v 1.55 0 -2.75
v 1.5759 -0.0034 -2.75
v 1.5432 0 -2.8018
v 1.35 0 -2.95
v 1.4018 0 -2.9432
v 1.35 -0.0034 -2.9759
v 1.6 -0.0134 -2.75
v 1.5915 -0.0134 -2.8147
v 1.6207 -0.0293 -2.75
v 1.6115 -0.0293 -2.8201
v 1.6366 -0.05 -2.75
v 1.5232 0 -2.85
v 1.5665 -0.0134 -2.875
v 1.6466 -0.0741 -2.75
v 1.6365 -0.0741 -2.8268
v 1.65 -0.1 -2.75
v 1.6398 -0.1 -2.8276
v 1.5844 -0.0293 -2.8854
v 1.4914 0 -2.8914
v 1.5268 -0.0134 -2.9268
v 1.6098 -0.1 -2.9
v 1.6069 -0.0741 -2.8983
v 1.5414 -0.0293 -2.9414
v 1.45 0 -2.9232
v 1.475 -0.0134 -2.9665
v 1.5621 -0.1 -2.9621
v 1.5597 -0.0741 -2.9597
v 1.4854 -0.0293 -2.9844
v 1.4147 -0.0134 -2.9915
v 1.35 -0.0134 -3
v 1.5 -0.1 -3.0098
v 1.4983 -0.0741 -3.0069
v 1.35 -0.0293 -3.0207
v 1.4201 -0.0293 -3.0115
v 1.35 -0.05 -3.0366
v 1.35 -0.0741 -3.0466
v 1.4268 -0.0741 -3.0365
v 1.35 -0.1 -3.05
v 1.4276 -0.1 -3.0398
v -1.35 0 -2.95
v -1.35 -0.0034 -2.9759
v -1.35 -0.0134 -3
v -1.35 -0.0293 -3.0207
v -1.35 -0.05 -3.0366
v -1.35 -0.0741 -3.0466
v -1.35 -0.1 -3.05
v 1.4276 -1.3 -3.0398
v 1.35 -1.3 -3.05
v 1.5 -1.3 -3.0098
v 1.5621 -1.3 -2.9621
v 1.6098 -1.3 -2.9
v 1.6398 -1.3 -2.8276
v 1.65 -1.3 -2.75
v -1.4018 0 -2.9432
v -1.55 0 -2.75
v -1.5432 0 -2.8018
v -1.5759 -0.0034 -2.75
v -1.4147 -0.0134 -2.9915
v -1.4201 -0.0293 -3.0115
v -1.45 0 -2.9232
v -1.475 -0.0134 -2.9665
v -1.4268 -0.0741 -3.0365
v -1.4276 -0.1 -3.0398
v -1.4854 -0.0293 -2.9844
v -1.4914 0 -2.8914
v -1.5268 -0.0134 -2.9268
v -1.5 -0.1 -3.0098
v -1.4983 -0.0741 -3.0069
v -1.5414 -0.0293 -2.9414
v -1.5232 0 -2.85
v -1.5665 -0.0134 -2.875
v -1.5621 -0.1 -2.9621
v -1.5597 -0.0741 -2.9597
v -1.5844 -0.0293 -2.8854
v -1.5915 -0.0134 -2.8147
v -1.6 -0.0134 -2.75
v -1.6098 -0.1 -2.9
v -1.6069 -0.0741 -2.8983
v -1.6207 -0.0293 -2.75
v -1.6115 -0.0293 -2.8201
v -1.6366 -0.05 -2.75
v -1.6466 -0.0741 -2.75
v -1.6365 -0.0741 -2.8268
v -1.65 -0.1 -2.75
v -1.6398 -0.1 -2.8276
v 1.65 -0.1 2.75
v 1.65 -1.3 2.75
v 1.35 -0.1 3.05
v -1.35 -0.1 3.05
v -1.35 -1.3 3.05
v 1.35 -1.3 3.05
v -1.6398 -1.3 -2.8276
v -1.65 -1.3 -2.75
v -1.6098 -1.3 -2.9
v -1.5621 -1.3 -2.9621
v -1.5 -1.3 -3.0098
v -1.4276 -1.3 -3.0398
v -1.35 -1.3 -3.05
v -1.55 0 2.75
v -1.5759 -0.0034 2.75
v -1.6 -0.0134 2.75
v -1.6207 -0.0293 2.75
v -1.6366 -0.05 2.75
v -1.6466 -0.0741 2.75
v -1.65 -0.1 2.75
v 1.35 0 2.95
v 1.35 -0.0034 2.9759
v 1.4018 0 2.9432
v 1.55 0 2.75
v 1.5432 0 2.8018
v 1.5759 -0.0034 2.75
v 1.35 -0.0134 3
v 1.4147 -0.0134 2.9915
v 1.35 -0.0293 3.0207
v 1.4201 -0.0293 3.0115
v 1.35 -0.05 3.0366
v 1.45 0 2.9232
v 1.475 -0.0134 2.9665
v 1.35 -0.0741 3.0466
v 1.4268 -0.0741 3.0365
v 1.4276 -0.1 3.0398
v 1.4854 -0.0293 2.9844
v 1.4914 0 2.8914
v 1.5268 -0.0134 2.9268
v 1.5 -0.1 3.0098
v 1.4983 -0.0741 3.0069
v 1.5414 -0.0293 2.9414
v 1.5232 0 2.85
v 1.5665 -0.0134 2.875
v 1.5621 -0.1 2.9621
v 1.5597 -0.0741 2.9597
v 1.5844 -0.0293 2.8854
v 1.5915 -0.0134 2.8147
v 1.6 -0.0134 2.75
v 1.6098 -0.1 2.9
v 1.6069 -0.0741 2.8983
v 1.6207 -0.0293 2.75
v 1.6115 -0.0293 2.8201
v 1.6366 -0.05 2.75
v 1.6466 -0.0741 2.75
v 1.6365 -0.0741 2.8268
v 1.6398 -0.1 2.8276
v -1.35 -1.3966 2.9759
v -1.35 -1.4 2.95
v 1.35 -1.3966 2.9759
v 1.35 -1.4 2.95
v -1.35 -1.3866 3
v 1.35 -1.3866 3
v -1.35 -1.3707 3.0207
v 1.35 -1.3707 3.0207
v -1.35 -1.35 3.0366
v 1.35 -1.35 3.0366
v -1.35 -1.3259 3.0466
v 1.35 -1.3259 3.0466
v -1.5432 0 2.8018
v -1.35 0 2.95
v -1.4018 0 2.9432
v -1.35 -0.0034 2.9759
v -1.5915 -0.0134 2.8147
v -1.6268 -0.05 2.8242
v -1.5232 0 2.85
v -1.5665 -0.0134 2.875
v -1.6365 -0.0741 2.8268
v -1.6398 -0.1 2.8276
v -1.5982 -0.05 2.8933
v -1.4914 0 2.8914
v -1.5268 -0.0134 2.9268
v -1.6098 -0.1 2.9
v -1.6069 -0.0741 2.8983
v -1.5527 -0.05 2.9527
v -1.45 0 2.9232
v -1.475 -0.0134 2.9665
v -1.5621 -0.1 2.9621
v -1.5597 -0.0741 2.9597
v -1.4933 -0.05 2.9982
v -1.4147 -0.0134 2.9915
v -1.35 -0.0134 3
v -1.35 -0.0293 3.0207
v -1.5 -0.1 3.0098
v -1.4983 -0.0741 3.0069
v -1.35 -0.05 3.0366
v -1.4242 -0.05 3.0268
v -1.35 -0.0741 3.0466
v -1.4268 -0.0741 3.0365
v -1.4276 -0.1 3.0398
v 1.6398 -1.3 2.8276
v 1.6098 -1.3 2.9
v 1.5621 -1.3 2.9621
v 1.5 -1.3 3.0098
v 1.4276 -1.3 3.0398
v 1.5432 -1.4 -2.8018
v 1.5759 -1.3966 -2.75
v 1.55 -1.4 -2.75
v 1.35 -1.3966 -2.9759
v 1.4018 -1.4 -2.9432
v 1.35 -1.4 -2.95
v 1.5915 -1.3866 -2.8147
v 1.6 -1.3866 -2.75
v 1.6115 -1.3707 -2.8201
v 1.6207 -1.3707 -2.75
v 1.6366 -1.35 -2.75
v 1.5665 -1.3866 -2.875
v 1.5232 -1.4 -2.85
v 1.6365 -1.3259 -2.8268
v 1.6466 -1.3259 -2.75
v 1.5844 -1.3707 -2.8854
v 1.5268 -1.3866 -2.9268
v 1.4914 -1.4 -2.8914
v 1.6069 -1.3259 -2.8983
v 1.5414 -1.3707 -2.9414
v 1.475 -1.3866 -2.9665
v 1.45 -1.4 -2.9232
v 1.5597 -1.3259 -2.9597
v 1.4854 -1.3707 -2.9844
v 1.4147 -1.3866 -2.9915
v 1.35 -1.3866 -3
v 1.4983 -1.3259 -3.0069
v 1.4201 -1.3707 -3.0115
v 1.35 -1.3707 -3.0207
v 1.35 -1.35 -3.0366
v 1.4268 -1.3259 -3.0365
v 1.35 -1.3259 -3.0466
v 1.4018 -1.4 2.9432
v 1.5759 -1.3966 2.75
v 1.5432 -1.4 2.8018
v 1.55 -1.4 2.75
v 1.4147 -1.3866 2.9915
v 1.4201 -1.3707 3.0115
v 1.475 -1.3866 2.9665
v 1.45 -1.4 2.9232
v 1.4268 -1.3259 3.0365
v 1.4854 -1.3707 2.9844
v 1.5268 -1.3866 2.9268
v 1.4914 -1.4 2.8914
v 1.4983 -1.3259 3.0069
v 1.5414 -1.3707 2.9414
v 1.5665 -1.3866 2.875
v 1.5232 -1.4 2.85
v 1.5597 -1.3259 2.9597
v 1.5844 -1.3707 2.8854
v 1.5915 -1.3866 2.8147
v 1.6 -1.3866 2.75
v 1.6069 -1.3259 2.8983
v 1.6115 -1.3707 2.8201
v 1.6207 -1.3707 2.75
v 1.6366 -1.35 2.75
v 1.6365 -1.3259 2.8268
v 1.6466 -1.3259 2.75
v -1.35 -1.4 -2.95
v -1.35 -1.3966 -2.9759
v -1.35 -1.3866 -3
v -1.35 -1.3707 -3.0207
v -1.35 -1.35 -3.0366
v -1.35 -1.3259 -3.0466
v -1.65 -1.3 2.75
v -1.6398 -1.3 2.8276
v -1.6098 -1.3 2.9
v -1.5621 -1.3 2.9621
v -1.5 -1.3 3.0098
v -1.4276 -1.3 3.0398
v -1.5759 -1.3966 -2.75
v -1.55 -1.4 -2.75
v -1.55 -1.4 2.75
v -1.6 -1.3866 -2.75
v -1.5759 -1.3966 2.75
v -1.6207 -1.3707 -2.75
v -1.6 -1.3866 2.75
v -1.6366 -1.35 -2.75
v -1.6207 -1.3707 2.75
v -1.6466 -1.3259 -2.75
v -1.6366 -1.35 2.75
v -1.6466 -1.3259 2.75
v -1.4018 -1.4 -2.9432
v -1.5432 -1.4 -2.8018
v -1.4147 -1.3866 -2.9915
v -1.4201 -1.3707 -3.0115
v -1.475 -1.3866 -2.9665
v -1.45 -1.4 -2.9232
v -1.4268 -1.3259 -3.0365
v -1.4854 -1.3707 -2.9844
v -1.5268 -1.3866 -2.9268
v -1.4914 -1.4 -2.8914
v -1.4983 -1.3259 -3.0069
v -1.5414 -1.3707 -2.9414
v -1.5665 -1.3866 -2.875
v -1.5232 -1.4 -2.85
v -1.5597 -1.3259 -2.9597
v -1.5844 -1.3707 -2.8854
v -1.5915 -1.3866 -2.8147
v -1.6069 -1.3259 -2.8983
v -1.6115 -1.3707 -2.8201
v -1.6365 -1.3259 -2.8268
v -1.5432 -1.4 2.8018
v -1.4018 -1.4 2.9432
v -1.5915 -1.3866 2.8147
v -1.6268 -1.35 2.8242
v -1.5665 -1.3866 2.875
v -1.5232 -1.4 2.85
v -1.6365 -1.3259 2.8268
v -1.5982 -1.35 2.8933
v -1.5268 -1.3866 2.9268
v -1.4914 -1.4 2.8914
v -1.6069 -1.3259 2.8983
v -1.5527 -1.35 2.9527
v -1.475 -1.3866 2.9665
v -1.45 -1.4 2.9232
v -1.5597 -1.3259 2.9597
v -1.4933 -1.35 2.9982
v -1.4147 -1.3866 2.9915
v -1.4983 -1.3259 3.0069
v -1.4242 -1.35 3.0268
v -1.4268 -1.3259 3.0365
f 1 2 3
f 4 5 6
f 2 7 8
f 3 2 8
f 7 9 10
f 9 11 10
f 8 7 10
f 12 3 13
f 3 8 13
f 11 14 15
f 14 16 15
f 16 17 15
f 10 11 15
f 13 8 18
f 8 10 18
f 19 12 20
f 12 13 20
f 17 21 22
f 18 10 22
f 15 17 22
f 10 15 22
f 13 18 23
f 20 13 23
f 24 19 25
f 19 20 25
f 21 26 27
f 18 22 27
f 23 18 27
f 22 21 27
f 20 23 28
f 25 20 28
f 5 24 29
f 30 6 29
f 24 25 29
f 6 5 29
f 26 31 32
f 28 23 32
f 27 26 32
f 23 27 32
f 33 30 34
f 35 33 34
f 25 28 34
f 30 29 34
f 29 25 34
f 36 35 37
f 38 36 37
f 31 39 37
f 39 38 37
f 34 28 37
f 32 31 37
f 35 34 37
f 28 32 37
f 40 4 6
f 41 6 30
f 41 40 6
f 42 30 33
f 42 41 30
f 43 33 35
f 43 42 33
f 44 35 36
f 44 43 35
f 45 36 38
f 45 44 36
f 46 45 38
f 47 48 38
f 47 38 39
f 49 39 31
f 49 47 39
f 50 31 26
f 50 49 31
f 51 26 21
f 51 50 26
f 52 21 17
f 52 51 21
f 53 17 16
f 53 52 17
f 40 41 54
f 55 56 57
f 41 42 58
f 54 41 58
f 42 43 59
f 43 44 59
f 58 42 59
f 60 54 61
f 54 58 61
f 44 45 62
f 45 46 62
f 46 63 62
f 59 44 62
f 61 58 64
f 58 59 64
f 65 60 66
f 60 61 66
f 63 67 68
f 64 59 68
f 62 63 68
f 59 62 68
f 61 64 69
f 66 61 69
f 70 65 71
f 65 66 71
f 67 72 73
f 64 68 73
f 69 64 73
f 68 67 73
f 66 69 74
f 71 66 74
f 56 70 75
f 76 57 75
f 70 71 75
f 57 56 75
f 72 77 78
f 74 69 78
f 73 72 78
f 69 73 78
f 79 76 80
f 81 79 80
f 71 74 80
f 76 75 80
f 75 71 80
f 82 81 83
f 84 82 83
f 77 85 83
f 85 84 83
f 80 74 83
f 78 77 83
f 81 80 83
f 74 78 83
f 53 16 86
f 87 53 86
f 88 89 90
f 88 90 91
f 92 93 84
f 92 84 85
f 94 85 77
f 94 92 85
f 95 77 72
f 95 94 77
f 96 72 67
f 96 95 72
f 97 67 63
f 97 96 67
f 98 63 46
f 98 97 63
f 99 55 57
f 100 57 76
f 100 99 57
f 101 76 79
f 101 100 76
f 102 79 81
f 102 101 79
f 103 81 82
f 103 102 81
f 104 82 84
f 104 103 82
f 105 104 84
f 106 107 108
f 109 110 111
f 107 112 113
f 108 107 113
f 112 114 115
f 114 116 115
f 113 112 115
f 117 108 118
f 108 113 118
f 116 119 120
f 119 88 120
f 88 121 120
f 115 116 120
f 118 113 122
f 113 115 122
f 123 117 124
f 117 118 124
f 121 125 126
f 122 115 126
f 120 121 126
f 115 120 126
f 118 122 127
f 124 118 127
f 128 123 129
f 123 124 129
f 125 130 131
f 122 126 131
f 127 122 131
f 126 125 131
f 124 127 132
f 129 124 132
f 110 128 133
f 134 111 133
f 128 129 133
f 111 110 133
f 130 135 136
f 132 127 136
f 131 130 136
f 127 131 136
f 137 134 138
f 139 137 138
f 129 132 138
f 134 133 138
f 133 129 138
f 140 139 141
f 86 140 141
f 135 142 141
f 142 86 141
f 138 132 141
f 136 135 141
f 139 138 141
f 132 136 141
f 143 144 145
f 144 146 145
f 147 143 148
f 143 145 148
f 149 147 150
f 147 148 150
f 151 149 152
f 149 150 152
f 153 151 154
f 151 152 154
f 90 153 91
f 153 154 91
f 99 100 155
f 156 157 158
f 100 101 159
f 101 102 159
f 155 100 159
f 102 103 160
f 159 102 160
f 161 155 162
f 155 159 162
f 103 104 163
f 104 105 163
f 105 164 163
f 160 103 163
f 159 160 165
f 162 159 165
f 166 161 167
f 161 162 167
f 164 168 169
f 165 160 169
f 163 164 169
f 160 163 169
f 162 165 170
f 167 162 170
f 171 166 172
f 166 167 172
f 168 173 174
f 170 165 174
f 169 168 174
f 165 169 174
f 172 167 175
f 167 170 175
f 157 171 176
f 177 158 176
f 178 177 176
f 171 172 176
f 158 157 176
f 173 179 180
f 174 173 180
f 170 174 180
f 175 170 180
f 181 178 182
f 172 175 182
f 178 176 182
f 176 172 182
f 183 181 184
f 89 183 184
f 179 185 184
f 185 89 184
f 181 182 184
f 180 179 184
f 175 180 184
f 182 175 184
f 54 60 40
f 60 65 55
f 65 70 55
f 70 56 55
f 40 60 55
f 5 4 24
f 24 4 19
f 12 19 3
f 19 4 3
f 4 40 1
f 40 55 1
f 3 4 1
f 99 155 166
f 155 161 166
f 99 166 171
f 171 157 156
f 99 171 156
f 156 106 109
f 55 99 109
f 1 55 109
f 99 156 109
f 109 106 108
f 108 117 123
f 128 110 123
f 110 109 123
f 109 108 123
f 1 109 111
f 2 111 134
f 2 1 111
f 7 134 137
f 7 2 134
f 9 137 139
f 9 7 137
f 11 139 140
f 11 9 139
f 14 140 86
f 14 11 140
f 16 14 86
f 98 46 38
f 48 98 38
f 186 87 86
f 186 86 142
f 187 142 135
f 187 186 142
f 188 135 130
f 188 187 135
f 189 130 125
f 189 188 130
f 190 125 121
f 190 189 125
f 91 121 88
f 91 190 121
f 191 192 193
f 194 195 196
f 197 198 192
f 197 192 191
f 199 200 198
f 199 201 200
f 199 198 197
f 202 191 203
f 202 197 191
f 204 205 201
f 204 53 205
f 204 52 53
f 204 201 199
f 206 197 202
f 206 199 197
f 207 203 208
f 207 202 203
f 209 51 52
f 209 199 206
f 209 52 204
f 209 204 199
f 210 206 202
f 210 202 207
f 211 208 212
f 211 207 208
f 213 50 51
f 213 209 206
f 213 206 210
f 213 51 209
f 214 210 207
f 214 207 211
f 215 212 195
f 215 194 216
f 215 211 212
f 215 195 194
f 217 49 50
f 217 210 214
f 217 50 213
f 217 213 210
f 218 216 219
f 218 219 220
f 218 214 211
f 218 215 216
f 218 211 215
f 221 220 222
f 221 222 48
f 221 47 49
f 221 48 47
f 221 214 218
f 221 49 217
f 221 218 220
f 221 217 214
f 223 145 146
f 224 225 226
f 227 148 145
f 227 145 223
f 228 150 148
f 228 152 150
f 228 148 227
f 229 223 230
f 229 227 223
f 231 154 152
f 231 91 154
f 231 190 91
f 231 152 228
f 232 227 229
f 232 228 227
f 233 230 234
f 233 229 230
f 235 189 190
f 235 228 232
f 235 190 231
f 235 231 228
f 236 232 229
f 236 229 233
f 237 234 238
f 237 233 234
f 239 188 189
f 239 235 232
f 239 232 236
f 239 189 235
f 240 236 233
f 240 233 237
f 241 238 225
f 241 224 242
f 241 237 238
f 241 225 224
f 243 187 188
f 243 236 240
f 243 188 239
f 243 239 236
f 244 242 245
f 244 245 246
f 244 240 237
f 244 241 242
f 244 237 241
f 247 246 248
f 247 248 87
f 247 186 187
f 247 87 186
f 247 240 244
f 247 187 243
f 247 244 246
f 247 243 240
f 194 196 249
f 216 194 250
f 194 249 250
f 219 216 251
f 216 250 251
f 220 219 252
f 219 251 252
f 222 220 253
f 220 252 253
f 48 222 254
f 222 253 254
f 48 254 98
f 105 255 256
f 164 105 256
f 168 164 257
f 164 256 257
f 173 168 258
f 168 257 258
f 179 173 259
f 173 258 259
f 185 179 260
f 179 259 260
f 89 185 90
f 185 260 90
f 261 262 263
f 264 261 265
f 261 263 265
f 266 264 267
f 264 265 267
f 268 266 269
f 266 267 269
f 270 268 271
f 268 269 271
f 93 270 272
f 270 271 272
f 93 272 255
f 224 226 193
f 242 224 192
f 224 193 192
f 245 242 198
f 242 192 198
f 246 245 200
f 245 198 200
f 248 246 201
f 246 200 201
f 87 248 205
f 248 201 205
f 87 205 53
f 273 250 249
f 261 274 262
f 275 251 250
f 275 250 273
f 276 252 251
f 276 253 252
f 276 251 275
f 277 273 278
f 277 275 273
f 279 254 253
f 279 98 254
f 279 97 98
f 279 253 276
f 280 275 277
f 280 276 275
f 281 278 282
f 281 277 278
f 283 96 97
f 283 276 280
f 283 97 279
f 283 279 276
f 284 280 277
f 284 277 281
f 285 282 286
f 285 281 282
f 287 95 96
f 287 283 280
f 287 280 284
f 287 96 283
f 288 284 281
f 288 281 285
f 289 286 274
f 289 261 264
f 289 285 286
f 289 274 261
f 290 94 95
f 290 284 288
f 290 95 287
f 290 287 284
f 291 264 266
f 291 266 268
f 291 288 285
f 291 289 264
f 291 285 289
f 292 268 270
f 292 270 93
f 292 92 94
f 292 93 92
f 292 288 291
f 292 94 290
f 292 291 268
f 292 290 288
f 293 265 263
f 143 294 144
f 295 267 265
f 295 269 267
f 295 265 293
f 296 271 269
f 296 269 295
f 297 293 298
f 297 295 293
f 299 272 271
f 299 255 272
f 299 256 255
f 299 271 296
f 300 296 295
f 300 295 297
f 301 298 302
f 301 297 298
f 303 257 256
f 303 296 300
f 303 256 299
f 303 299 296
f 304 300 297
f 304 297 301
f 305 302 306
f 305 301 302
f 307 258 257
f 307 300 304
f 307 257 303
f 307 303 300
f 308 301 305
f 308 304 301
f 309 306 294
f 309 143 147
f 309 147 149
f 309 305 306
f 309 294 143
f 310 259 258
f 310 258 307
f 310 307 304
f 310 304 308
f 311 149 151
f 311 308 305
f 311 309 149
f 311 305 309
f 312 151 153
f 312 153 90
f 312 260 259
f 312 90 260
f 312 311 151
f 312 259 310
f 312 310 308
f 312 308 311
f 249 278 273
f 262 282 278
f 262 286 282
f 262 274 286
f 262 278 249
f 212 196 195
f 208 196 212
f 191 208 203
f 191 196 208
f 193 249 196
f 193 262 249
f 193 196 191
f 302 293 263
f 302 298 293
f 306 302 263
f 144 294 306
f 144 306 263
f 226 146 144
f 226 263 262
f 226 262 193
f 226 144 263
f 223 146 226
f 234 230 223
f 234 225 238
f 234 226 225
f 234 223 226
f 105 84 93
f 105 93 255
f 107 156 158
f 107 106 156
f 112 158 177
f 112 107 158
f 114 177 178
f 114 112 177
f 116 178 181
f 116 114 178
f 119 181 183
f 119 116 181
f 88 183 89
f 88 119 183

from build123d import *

# Parameters (mm, degrees)
F0_W     = 3.3
F0_H     = 6.1
F1_DEPTH = 1.4
F2_R     = 0.3
F3_R     = 0.1


with BuildPart() as f1:
    # F0 (on Front) → F1 (new body)
    with BuildSketch(Plane.XZ):
        Rectangle(F0_W, F0_H)
    extrude(amount=F1_DEPTH)

    # F2
    f2_edges = [f1.edges().sort_by_distance(p)[0] for p in [
        (1.65, -0.7, 3.05),
        (-1.65, -0.7, 3.05),
        (-1.65, -0.7, -3.05),
        (1.65, -0.7, -3.05),
    ]]
    fillet(f2_edges, radius=F2_R)

    # F3
    f3_edges = [f1.edges().sort_by_distance(p)[0] for p in [
        (0, -1.4, 3.05),
        (1.562132, -1.4, 2.962132),
        (-1.562132, -1.4, 2.962132),
        (1.65, -1.4, 0),
        (-1.65, -1.4, 0),
        (1.562132, -1.4, -2.962132),
        (-1.562132, -1.4, -2.962132),
        (0, -1.4, -3.05),
        (0, 0, 3.05),
        (1.562132, 0, 2.962132),
        (-1.562132, 0, 2.962132),
        (1.65, 0, 0),
        (-1.65, 0, 0),
        (1.562132, 0, -2.962132),
        (-1.562132, 0, -2.962132),
        (0, 0, -3.05),
    ]]
    fillet(f3_edges, radius=F3_R)


solid = f1.part
